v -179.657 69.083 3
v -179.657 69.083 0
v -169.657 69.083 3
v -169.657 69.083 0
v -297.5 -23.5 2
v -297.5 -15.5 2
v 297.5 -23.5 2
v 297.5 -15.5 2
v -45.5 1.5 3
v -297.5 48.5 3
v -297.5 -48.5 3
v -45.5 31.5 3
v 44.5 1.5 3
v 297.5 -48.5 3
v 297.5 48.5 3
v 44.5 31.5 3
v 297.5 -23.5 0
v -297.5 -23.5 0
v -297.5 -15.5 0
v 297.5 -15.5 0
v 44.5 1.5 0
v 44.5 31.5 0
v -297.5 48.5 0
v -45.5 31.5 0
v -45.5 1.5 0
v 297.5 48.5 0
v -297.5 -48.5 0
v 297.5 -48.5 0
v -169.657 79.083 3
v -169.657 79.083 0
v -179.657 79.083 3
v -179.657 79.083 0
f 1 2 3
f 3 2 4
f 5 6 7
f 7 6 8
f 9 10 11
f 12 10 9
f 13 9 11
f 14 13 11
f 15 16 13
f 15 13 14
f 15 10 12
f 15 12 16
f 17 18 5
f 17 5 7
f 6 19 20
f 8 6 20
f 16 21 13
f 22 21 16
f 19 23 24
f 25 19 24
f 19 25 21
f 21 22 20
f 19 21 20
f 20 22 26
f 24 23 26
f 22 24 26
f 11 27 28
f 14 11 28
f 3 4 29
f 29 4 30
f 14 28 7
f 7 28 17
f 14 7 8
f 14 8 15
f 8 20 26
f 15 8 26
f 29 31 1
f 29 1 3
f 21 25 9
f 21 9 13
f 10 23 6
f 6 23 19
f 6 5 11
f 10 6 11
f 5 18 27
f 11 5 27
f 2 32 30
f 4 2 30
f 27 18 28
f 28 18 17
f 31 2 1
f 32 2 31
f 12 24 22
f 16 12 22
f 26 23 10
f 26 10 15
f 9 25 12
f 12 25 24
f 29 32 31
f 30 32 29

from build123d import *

# Parameters (mm, degrees)
F0_W     = 595
F0_H     = 64
F0_W_2   = 90
F0_H_2   = 30
F0_H_3   = 25
F0_H_4   = 8
F1_DEPTH = 3
F2_DEPTH = 2
F0_W_3   = 10
F0_H_5   = 10
F3_DEPTH = 3


with BuildPart() as f1:
    # F0 (on Top) → F1 (new body)
    with BuildSketch(Plane.XY):
        with Locations((0, 16.5)):
            Rectangle(F0_W, F0_H)
        with Locations((-0.5, 16.5)):
            Rectangle(F0_W_2, F0_H_2, mode=Mode.SUBTRACT)
        with Locations((0, -36)):
            Rectangle(F0_W, F0_H_3)
        with Locations((0, -19.5)):
            Rectangle(F0_W, F0_H_4)
    extrude(amount=F1_DEPTH)

    # F0 (on Top) → F2 (cut)
    with BuildSketch(Plane.XY):
        with Locations((0, -19.5)):
            Rectangle(F0_W, F0_H_4)
    extrude(amount=F2_DEPTH, mode=Mode.SUBTRACT)


with BuildPart() as f3:
    # F0 (on Top) → F3 (new body)
    with BuildSketch(Plane.XY):
        with Locations((-174.657474, 74.083489)):
            Rectangle(F0_W_3, F0_H_5)
    extrude(amount=F3_DEPTH)


solid = Compound([f1.part, f3.part])
